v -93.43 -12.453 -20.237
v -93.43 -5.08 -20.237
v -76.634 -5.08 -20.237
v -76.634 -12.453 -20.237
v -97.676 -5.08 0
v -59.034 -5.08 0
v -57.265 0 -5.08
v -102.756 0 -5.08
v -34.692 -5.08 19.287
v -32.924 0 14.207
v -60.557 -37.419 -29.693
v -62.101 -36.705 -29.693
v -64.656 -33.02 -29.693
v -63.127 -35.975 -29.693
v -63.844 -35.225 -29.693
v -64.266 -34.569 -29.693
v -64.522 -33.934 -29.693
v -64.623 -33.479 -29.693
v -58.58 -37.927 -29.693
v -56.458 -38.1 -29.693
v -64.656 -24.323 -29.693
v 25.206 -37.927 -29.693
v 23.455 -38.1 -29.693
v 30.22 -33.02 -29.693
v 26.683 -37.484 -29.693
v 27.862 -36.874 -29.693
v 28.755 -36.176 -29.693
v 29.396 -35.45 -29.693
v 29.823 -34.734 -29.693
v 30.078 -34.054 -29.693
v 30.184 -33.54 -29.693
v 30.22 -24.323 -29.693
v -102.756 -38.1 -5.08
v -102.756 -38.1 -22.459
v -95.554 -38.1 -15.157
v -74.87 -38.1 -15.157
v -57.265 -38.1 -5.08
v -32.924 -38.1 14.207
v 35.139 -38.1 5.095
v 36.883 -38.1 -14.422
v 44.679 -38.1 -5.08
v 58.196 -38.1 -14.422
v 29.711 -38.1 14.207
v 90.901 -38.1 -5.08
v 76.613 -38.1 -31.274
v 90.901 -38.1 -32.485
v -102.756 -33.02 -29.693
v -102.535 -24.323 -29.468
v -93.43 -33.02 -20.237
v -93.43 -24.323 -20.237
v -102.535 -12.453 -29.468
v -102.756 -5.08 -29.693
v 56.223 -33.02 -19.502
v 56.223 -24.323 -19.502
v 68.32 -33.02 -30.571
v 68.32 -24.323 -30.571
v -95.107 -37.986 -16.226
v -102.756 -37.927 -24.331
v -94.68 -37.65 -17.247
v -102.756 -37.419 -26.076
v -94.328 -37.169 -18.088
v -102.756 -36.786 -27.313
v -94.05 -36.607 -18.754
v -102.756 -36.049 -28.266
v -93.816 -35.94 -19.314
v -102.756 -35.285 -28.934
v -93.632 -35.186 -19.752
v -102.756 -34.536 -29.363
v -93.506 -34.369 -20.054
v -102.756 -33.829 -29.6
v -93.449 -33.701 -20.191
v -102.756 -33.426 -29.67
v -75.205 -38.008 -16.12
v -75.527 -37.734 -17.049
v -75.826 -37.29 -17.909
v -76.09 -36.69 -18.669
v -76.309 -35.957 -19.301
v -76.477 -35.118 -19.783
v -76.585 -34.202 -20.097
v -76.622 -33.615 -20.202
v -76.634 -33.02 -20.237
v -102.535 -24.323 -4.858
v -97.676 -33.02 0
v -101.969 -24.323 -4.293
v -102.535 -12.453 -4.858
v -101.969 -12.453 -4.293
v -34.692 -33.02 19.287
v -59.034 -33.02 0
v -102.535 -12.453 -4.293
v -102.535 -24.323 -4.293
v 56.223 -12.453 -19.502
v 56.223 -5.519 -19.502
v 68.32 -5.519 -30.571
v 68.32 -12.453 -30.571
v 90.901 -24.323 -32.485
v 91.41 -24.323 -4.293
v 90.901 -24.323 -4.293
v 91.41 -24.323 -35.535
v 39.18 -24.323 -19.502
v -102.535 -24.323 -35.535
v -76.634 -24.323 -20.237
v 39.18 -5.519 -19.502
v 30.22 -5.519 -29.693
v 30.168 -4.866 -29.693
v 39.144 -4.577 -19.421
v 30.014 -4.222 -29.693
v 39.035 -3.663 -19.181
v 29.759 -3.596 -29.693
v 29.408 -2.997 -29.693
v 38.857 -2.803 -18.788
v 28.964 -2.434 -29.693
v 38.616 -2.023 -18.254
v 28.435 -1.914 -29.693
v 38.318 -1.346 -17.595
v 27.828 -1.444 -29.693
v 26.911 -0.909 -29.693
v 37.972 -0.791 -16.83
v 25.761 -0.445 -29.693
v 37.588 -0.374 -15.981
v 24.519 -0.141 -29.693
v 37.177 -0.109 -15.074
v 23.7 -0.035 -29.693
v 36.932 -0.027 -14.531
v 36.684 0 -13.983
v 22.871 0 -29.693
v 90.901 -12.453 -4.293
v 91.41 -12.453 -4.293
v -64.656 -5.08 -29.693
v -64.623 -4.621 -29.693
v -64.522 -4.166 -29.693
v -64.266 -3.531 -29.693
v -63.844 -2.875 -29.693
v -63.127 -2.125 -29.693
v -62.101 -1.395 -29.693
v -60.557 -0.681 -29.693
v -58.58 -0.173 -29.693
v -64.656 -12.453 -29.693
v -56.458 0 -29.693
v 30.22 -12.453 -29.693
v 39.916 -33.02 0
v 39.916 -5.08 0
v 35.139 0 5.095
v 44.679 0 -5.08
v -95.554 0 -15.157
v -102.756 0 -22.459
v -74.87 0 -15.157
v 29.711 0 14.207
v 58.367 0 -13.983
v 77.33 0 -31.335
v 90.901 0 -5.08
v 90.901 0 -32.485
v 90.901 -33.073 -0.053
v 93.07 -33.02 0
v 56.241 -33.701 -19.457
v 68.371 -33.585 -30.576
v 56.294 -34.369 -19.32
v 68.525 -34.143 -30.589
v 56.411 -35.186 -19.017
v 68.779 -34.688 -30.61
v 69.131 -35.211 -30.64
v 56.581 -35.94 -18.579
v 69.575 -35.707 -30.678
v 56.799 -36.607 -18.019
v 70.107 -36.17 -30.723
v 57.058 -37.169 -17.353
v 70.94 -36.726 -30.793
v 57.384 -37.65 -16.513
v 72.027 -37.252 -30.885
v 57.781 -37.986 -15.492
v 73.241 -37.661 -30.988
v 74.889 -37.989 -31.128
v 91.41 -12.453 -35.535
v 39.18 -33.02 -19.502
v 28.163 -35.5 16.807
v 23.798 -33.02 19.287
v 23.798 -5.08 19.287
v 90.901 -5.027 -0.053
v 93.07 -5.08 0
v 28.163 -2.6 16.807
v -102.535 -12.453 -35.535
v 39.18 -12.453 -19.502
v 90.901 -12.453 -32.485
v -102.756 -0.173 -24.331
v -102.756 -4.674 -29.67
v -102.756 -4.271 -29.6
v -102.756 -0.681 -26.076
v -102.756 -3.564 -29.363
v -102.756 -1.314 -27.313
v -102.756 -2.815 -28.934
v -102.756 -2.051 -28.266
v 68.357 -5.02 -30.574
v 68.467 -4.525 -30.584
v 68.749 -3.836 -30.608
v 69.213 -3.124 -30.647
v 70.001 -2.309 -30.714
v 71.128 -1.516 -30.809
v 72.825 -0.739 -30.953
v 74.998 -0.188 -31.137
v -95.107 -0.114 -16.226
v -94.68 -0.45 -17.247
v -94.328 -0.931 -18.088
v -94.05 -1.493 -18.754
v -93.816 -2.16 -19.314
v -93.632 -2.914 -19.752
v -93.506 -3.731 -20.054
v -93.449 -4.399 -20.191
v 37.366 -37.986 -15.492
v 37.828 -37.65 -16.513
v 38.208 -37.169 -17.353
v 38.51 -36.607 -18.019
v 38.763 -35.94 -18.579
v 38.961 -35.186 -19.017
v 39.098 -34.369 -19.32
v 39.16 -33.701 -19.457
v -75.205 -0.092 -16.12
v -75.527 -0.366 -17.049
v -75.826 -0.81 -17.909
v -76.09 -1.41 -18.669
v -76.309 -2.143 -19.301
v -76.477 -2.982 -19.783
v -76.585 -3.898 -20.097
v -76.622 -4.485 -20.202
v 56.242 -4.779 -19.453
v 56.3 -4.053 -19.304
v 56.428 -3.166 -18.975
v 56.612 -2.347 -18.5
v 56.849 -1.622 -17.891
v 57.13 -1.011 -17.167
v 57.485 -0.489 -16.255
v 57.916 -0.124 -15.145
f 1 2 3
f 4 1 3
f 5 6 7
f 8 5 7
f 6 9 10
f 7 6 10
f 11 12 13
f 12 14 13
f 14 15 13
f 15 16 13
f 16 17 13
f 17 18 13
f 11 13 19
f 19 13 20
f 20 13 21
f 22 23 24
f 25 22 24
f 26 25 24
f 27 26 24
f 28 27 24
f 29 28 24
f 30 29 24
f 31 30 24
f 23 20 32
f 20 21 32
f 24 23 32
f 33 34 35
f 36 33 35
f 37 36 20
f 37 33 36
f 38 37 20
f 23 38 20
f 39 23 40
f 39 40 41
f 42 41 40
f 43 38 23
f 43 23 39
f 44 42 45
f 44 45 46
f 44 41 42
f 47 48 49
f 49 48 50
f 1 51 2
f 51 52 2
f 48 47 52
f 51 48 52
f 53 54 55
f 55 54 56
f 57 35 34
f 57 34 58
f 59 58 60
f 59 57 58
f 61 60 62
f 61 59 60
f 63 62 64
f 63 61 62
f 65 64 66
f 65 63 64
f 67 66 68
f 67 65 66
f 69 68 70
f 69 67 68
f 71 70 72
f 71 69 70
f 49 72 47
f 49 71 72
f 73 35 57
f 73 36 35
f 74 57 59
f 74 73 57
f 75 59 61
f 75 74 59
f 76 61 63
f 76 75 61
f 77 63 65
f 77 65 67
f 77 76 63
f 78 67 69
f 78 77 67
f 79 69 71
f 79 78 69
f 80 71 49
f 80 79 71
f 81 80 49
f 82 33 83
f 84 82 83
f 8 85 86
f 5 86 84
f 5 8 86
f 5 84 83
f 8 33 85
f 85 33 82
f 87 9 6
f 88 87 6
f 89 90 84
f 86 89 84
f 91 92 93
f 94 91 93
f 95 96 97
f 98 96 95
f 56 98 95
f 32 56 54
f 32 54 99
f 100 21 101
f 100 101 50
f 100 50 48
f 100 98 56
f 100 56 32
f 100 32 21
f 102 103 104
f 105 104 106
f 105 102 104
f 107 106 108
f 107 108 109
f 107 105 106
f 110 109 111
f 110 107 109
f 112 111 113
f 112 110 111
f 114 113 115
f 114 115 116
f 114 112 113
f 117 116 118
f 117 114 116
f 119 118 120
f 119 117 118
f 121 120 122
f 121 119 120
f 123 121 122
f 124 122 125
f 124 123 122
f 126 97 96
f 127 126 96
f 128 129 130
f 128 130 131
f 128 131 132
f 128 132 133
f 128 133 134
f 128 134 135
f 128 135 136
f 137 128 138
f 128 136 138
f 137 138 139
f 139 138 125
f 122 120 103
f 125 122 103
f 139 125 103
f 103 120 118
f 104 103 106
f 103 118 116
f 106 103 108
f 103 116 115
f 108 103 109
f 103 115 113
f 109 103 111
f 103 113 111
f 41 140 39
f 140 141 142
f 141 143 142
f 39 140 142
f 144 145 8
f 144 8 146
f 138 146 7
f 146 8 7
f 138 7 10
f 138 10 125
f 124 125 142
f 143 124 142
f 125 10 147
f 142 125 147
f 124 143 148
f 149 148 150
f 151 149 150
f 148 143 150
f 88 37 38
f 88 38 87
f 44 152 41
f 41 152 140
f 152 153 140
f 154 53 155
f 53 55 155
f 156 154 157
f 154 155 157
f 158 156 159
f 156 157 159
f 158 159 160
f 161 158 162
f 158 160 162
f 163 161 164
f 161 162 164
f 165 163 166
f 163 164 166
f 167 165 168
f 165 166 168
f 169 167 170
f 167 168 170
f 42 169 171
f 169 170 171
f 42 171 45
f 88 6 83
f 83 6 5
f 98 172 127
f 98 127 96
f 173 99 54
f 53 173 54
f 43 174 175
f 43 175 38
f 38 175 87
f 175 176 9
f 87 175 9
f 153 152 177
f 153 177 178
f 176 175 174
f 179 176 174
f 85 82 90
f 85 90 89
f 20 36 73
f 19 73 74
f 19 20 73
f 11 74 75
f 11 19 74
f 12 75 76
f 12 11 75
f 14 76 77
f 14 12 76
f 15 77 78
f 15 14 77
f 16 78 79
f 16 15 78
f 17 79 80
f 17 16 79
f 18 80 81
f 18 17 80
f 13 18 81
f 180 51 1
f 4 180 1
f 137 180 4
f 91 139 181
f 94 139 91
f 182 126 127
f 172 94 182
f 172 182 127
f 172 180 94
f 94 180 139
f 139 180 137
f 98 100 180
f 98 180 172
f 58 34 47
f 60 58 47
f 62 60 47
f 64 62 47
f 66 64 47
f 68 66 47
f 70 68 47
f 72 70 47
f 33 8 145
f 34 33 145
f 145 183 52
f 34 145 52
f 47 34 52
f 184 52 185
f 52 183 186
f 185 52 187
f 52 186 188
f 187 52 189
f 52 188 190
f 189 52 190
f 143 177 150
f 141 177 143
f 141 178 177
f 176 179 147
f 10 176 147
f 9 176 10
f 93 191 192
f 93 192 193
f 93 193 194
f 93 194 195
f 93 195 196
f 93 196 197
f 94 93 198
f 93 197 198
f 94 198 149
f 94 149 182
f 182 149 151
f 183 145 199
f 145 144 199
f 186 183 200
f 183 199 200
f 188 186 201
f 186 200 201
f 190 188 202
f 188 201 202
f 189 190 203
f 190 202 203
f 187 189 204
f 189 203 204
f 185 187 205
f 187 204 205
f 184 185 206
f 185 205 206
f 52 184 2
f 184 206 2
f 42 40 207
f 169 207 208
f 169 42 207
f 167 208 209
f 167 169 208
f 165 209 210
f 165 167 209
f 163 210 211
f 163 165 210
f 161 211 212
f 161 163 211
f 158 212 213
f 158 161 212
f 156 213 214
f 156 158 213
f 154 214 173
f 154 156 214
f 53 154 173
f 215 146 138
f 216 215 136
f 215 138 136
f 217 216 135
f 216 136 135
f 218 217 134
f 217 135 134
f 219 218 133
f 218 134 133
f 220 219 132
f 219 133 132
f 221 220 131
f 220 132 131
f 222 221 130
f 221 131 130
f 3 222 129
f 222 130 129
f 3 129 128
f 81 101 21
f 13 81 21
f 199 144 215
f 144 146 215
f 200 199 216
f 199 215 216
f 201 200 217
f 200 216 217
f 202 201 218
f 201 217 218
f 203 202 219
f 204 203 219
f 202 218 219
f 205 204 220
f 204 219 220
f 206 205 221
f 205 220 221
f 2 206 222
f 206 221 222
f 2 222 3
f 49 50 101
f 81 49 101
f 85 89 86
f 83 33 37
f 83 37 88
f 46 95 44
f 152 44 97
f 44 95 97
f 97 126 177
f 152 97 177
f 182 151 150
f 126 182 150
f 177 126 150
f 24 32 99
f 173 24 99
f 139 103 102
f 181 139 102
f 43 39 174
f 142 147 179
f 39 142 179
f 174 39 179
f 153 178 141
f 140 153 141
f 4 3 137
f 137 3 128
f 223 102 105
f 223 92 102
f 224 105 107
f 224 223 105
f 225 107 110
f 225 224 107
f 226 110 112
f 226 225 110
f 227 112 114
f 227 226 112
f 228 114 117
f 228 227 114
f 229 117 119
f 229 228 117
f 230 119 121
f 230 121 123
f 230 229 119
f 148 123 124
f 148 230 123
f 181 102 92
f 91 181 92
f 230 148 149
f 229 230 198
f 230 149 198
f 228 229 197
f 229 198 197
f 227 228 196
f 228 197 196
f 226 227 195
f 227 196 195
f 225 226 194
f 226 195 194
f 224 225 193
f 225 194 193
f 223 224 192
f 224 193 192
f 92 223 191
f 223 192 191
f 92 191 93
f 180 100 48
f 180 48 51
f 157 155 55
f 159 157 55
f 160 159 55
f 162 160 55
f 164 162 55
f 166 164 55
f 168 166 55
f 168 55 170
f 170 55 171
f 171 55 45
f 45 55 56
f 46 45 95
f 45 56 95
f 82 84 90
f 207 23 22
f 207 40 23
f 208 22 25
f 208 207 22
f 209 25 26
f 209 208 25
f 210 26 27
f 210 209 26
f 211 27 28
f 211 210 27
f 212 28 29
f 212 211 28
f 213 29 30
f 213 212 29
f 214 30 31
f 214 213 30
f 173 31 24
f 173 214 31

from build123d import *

# Parameters (mm, degrees)
F1_DEPTH      = 38.1
F2_T1_DEPTH   = 64.2282991577
F2_T3_DEPTH   = 53.4259096179
F2_T8_DEPTH   = 69.8505852304
F2_T13_DEPTH  = 69.8505852304
F2_T18_DEPTH  = 57.18488627
F2_T23_DEPTH  = 57.18488627
F2_T29_DEPTH  = 57.18488627
F2_T33_DEPTH  = 56.7864356516
F2_T40_DEPTH  = 56.7864356516
F2_T44_DEPTH  = 57.18488627
F3_R          = 5.5188922036
F4_R          = 5.08
F5_SIZE       = 5.08
F6_SIZE       = 5.08
F8_DEPTH      = 5.842
F8_DEPTH_BACK = 25.4


# Not quite as in the source:
# - a fillet or chamfer that OpenCascade refuses, or shapes differently, is made with other operations: its cross-section is extruded or revolved along the edge and cut away or added


with BuildPart() as f1:
    # F0 (on Front) → F1 (new body)
    with BuildSketch(Plane.XZ):
        Polygon((68.3197870099, -30.5711814668), (90.9013386944, -32.4848717284), (90.9013386944, -19.5518693537), (90.9013386944, -0.0529484335), (93.0701802755, 0), (60.7909710004, 0), (39.9160396704, 0), (35.1392942637, 5.0951969111), (26.685241969, 19.2868879506), (6.6764656577, 19.2868879506), (-19.6780025163, 19.2868879506), (-34.6921224135, 19.2868879506), (-59.0340113345, 0), (-76.2522614858, 0), (-85.7398739654, 0), (-102.7562974073, 0), (-102.7562974073, -29.6926991102), (-93.4295707114, -20.2366987188), (-86.7940447176, -20.2366987188), (-78.7120151127, -20.2366987188), (-76.6338963938, -20.2366987188), (-64.6562974073, -29.6926991102), (-40.7615778127, -29.6926991102), (-19.6780025163, -29.6926991102), (0, -29.6926991102), (14.0557177055, -29.6926991102), (30.2197870099, -29.6926991102), (39.1803090661, -19.5023065498), (56.2228657745, -19.5023065498), align=None)
    extrude(amount=F1_DEPTH)

    # F2: chamfer of 5.08 on 6 edges, made by hand

    # F2_s2 → F2_t1 (cut)
    with BuildSketch(Plane.XZ.offset(-13.0641495789)):
        Polygon((-102.7562974073, -5.08), (-97.6762974073, 0), (-102.7562974073, 0), align=None)
    extrude(amount=F2_T1_DEPTH, mode=Mode.SUBTRACT)

    # F2_s4 → F2_t3 (cut)
    with BuildSketch(Plane.XZ.offset(-7.6629548089)):
        Polygon((23.7983706465, 19.2868879506), (28.1626838525, 16.8067283763), (26.685241969, 19.2868879506), align=None)
    extrude(amount=F2_T3_DEPTH, mode=Mode.SUBTRACT)


with BuildPart() as f2_tool6:
    # F2_s7 → F2_t8 (new body)
    with BuildSketch(Plane.YZ.offset(-115.8204469861)):
        Polygon((-38.1, -5.08), (-33.02, 0), (-38.1, 0), align=None)
    extrude(amount=F2_T8_DEPTH)

    split(bisect_by=Plane(origin=(-22.7676995967, 0, 28.7350046307), x_dir=(0, 1, 0), z_dir=(-0.6210240643, 0, 0.7837914975)), keep=Keep.TOP)


with BuildPart() as f1_1:
    add(f1.part)

    # F2_t5: cut F2_tool6
    add(f2_tool6.part, mode=Mode.SUBTRACT)


with BuildPart() as f2_tool11:
    # F2_s12 → F2_t13 (new body)
    with BuildSketch(Plane.YZ.offset(-45.9698617557)):
        Polygon((-5.08, 0), (0, -5.08), (0, 0), align=None)
    extrude(amount=-F2_T13_DEPTH)

    split(bisect_by=Plane(origin=(-22.7676995967, 0, 28.7350046307), x_dir=(0, 1, 0), z_dir=(-0.6210240643, 0, 0.7837914975)), keep=Keep.TOP)


with BuildPart() as f1_2:
    add(f1_1.part)

    # F2_t10: cut F2_tool11
    add(f2_tool11.part, mode=Mode.SUBTRACT)


with BuildPart() as f2_tool16:
    # F2_s17 → F2_t18 (new body)
    with BuildSketch(Plane(origin=(-1.6848534543, 0, -1.3349654126), x_dir=(0, 1, 0), z_dir=(-0.7837914975, 0, -0.6210240643))):
        Polygon((-38.1, -31.5815416486), (-33.02, -36.6615416486), (-38.1, -36.6615416486), align=None)
    extrude(amount=F2_T18_DEPTH)

    split(bisect_by=Plane.XY, keep=Keep.TOP)


with BuildPart() as f1_3:
    add(f1_2.part)

    # F2_t15: cut F2_tool16
    add(f2_tool16.part, mode=Mode.SUBTRACT)


with BuildPart() as f2_tool21:
    # F2_s22 → F2_t23 (new body)
    with BuildSketch(Plane(origin=(-1.6848534543, 0, -1.3349654126), x_dir=(0, 1, 0), z_dir=(-0.7837914975, 0, -0.6210240643))):
        Polygon((-5.08, -36.6615416486), (0, -31.5815416486), (0, -36.6615416486), align=None)
    extrude(amount=F2_T23_DEPTH)

    split(bisect_by=Plane.XY, keep=Keep.TOP)


with BuildPart() as f1_4:
    add(f1_3.part)

    # F2_t20: cut F2_tool21
    add(f2_tool21.part, mode=Mode.SUBTRACT)


with BuildPart() as f2_tool27:
    # F2_s28 → F2_t29 (new body)
    with BuildSketch(Plane(origin=(-1.6848534543, 0, -1.3349654126), x_dir=(0, 1, 0), z_dir=(-0.7837914975, 0, -0.6210240643))):
        Polygon((-38.1, -31.5815416486), (-33.02, -36.6615416486), (-38.1, -36.6615416486), align=None)
    extrude(amount=F2_T29_DEPTH)

    split(bisect_by=Plane.XY, keep=Keep.BOTTOM)


with BuildPart() as f2_tool31:
    # F2_s32 → F2_t33 (new body)
    with BuildSketch(Plane.YZ.offset(-102.7562974073)):
        Polygon((-38.1, -5.08), (-33.02, 0), (-38.1, 0), align=None)
    extrude(amount=F2_T33_DEPTH)

    split(bisect_by=Plane(origin=(-22.7676995967, 0, 28.7350046307), x_dir=(0, 1, 0), z_dir=(0.6210240643, 0, -0.7837914975)), keep=Keep.TOP)


with BuildPart() as f2_tool27_1:
    add(f2_tool27.part)

    # F2_t35: intersect F2_tool31
    add(f2_tool31.part, mode=Mode.INTERSECT)


with BuildPart() as f1_5:
    add(f1_4.part)

    # F2_t25: cut F2_tool27
    add(f2_tool27_1.part, mode=Mode.SUBTRACT)


with BuildPart() as f2_tool38:
    # F2_s39 → F2_t40 (new body)
    with BuildSketch(Plane.YZ.offset(-45.9698617557)):
        Polygon((-5.08, 0), (0, -5.08), (0, 0), align=None)
    extrude(amount=-F2_T40_DEPTH)

    split(bisect_by=Plane(origin=(-22.7676995967, 0, 28.7350046307), x_dir=(0, 1, 0), z_dir=(0.6210240643, 0, -0.7837914975)), keep=Keep.TOP)


with BuildPart() as f2_tool42:
    # F2_s43 → F2_t44 (new body)
    with BuildSketch(Plane(origin=(-1.6848534543, 0, -1.3349654126), x_dir=(0, 1, 0), z_dir=(-0.7837914975, 0, -0.6210240643))):
        Polygon((-5.08, -36.6615416486), (0, -31.5815416486), (0, -36.6615416486), align=None)
    extrude(amount=F2_T44_DEPTH)

    split(bisect_by=Plane.XY, keep=Keep.BOTTOM)


with BuildPart() as f2_tool38_1:
    add(f2_tool38.part)

    # F2_t46: intersect F2_tool42
    add(f2_tool42.part, mode=Mode.INTERSECT)


with BuildPart() as f1_6:
    add(f1_5.part)

    # F2_t36: cut F2_tool38
    add(f2_tool38_1.part, mode=Mode.SUBTRACT)

    # F3
    f3_edges = [f1_6.edges().sort_by_distance(p)[0] for p in [
        (62.271326, 0, -25.036744),
        (47.701587, 0, -19.502307),
        (34.700048, 0, -24.597503),
    ]]
    fillet(f3_edges, radius=F3_R)

    # F4
    f4_edges = [f1_6.edges().sort_by_distance(p)[0] for p in [
        (34.700048, -38.1, -24.597503),
        (47.701587, -38.1, -19.502307),
        (62.271326, -38.1, -25.036744),
        (-70.645097, 0, -24.964699),
        (-85.031734, 0, -20.236699),
        (-98.092934, 0, -24.964699),
        (-85.031734, -38.1, -20.236699),
        (-70.645097, -38.1, -24.964699),
        (-98.092934, -38.1, -24.964699),
    ]]
    fillet(f4_edges, radius=F4_R)

    # F5
    f5_edges = [f1_6.edges().sort_by_distance(p)[0] for p in [
        (66.49311, -38.1, 0),
        (66.49311, 0, 0),
    ]]
    chamfer(f5_edges, length=F5_SIZE)

    # F6
    f6_edges = [f1_6.edges().sort_by_distance(p)[0] for p in [
        (-1.356857, 0, 19.286888),
        (-1.356857, -38.1, 19.286888),
    ]]
    chamfer(f6_edges, length=F6_SIZE)

    # F7 (on face) → F8 (join, two sides)
    with BuildSketch(Plane(origin=(0, 0, -29.6926991102), x_dir=(1, 0, 0), z_dir=(0, 0, -1))) as f8_sk:
        Polygon((-102.5345399976, 24.3232287467), (-102.5345399976, 12.4534405768), (90.11746943, 12.4534405768), (91.410189867, 12.4534405768), (91.410189867, 24.3232287467), align=None)
    extrude(amount=F8_DEPTH)
    extrude(f8_sk.sketch, amount=-F8_DEPTH_BACK)


solid = f1_6.part
